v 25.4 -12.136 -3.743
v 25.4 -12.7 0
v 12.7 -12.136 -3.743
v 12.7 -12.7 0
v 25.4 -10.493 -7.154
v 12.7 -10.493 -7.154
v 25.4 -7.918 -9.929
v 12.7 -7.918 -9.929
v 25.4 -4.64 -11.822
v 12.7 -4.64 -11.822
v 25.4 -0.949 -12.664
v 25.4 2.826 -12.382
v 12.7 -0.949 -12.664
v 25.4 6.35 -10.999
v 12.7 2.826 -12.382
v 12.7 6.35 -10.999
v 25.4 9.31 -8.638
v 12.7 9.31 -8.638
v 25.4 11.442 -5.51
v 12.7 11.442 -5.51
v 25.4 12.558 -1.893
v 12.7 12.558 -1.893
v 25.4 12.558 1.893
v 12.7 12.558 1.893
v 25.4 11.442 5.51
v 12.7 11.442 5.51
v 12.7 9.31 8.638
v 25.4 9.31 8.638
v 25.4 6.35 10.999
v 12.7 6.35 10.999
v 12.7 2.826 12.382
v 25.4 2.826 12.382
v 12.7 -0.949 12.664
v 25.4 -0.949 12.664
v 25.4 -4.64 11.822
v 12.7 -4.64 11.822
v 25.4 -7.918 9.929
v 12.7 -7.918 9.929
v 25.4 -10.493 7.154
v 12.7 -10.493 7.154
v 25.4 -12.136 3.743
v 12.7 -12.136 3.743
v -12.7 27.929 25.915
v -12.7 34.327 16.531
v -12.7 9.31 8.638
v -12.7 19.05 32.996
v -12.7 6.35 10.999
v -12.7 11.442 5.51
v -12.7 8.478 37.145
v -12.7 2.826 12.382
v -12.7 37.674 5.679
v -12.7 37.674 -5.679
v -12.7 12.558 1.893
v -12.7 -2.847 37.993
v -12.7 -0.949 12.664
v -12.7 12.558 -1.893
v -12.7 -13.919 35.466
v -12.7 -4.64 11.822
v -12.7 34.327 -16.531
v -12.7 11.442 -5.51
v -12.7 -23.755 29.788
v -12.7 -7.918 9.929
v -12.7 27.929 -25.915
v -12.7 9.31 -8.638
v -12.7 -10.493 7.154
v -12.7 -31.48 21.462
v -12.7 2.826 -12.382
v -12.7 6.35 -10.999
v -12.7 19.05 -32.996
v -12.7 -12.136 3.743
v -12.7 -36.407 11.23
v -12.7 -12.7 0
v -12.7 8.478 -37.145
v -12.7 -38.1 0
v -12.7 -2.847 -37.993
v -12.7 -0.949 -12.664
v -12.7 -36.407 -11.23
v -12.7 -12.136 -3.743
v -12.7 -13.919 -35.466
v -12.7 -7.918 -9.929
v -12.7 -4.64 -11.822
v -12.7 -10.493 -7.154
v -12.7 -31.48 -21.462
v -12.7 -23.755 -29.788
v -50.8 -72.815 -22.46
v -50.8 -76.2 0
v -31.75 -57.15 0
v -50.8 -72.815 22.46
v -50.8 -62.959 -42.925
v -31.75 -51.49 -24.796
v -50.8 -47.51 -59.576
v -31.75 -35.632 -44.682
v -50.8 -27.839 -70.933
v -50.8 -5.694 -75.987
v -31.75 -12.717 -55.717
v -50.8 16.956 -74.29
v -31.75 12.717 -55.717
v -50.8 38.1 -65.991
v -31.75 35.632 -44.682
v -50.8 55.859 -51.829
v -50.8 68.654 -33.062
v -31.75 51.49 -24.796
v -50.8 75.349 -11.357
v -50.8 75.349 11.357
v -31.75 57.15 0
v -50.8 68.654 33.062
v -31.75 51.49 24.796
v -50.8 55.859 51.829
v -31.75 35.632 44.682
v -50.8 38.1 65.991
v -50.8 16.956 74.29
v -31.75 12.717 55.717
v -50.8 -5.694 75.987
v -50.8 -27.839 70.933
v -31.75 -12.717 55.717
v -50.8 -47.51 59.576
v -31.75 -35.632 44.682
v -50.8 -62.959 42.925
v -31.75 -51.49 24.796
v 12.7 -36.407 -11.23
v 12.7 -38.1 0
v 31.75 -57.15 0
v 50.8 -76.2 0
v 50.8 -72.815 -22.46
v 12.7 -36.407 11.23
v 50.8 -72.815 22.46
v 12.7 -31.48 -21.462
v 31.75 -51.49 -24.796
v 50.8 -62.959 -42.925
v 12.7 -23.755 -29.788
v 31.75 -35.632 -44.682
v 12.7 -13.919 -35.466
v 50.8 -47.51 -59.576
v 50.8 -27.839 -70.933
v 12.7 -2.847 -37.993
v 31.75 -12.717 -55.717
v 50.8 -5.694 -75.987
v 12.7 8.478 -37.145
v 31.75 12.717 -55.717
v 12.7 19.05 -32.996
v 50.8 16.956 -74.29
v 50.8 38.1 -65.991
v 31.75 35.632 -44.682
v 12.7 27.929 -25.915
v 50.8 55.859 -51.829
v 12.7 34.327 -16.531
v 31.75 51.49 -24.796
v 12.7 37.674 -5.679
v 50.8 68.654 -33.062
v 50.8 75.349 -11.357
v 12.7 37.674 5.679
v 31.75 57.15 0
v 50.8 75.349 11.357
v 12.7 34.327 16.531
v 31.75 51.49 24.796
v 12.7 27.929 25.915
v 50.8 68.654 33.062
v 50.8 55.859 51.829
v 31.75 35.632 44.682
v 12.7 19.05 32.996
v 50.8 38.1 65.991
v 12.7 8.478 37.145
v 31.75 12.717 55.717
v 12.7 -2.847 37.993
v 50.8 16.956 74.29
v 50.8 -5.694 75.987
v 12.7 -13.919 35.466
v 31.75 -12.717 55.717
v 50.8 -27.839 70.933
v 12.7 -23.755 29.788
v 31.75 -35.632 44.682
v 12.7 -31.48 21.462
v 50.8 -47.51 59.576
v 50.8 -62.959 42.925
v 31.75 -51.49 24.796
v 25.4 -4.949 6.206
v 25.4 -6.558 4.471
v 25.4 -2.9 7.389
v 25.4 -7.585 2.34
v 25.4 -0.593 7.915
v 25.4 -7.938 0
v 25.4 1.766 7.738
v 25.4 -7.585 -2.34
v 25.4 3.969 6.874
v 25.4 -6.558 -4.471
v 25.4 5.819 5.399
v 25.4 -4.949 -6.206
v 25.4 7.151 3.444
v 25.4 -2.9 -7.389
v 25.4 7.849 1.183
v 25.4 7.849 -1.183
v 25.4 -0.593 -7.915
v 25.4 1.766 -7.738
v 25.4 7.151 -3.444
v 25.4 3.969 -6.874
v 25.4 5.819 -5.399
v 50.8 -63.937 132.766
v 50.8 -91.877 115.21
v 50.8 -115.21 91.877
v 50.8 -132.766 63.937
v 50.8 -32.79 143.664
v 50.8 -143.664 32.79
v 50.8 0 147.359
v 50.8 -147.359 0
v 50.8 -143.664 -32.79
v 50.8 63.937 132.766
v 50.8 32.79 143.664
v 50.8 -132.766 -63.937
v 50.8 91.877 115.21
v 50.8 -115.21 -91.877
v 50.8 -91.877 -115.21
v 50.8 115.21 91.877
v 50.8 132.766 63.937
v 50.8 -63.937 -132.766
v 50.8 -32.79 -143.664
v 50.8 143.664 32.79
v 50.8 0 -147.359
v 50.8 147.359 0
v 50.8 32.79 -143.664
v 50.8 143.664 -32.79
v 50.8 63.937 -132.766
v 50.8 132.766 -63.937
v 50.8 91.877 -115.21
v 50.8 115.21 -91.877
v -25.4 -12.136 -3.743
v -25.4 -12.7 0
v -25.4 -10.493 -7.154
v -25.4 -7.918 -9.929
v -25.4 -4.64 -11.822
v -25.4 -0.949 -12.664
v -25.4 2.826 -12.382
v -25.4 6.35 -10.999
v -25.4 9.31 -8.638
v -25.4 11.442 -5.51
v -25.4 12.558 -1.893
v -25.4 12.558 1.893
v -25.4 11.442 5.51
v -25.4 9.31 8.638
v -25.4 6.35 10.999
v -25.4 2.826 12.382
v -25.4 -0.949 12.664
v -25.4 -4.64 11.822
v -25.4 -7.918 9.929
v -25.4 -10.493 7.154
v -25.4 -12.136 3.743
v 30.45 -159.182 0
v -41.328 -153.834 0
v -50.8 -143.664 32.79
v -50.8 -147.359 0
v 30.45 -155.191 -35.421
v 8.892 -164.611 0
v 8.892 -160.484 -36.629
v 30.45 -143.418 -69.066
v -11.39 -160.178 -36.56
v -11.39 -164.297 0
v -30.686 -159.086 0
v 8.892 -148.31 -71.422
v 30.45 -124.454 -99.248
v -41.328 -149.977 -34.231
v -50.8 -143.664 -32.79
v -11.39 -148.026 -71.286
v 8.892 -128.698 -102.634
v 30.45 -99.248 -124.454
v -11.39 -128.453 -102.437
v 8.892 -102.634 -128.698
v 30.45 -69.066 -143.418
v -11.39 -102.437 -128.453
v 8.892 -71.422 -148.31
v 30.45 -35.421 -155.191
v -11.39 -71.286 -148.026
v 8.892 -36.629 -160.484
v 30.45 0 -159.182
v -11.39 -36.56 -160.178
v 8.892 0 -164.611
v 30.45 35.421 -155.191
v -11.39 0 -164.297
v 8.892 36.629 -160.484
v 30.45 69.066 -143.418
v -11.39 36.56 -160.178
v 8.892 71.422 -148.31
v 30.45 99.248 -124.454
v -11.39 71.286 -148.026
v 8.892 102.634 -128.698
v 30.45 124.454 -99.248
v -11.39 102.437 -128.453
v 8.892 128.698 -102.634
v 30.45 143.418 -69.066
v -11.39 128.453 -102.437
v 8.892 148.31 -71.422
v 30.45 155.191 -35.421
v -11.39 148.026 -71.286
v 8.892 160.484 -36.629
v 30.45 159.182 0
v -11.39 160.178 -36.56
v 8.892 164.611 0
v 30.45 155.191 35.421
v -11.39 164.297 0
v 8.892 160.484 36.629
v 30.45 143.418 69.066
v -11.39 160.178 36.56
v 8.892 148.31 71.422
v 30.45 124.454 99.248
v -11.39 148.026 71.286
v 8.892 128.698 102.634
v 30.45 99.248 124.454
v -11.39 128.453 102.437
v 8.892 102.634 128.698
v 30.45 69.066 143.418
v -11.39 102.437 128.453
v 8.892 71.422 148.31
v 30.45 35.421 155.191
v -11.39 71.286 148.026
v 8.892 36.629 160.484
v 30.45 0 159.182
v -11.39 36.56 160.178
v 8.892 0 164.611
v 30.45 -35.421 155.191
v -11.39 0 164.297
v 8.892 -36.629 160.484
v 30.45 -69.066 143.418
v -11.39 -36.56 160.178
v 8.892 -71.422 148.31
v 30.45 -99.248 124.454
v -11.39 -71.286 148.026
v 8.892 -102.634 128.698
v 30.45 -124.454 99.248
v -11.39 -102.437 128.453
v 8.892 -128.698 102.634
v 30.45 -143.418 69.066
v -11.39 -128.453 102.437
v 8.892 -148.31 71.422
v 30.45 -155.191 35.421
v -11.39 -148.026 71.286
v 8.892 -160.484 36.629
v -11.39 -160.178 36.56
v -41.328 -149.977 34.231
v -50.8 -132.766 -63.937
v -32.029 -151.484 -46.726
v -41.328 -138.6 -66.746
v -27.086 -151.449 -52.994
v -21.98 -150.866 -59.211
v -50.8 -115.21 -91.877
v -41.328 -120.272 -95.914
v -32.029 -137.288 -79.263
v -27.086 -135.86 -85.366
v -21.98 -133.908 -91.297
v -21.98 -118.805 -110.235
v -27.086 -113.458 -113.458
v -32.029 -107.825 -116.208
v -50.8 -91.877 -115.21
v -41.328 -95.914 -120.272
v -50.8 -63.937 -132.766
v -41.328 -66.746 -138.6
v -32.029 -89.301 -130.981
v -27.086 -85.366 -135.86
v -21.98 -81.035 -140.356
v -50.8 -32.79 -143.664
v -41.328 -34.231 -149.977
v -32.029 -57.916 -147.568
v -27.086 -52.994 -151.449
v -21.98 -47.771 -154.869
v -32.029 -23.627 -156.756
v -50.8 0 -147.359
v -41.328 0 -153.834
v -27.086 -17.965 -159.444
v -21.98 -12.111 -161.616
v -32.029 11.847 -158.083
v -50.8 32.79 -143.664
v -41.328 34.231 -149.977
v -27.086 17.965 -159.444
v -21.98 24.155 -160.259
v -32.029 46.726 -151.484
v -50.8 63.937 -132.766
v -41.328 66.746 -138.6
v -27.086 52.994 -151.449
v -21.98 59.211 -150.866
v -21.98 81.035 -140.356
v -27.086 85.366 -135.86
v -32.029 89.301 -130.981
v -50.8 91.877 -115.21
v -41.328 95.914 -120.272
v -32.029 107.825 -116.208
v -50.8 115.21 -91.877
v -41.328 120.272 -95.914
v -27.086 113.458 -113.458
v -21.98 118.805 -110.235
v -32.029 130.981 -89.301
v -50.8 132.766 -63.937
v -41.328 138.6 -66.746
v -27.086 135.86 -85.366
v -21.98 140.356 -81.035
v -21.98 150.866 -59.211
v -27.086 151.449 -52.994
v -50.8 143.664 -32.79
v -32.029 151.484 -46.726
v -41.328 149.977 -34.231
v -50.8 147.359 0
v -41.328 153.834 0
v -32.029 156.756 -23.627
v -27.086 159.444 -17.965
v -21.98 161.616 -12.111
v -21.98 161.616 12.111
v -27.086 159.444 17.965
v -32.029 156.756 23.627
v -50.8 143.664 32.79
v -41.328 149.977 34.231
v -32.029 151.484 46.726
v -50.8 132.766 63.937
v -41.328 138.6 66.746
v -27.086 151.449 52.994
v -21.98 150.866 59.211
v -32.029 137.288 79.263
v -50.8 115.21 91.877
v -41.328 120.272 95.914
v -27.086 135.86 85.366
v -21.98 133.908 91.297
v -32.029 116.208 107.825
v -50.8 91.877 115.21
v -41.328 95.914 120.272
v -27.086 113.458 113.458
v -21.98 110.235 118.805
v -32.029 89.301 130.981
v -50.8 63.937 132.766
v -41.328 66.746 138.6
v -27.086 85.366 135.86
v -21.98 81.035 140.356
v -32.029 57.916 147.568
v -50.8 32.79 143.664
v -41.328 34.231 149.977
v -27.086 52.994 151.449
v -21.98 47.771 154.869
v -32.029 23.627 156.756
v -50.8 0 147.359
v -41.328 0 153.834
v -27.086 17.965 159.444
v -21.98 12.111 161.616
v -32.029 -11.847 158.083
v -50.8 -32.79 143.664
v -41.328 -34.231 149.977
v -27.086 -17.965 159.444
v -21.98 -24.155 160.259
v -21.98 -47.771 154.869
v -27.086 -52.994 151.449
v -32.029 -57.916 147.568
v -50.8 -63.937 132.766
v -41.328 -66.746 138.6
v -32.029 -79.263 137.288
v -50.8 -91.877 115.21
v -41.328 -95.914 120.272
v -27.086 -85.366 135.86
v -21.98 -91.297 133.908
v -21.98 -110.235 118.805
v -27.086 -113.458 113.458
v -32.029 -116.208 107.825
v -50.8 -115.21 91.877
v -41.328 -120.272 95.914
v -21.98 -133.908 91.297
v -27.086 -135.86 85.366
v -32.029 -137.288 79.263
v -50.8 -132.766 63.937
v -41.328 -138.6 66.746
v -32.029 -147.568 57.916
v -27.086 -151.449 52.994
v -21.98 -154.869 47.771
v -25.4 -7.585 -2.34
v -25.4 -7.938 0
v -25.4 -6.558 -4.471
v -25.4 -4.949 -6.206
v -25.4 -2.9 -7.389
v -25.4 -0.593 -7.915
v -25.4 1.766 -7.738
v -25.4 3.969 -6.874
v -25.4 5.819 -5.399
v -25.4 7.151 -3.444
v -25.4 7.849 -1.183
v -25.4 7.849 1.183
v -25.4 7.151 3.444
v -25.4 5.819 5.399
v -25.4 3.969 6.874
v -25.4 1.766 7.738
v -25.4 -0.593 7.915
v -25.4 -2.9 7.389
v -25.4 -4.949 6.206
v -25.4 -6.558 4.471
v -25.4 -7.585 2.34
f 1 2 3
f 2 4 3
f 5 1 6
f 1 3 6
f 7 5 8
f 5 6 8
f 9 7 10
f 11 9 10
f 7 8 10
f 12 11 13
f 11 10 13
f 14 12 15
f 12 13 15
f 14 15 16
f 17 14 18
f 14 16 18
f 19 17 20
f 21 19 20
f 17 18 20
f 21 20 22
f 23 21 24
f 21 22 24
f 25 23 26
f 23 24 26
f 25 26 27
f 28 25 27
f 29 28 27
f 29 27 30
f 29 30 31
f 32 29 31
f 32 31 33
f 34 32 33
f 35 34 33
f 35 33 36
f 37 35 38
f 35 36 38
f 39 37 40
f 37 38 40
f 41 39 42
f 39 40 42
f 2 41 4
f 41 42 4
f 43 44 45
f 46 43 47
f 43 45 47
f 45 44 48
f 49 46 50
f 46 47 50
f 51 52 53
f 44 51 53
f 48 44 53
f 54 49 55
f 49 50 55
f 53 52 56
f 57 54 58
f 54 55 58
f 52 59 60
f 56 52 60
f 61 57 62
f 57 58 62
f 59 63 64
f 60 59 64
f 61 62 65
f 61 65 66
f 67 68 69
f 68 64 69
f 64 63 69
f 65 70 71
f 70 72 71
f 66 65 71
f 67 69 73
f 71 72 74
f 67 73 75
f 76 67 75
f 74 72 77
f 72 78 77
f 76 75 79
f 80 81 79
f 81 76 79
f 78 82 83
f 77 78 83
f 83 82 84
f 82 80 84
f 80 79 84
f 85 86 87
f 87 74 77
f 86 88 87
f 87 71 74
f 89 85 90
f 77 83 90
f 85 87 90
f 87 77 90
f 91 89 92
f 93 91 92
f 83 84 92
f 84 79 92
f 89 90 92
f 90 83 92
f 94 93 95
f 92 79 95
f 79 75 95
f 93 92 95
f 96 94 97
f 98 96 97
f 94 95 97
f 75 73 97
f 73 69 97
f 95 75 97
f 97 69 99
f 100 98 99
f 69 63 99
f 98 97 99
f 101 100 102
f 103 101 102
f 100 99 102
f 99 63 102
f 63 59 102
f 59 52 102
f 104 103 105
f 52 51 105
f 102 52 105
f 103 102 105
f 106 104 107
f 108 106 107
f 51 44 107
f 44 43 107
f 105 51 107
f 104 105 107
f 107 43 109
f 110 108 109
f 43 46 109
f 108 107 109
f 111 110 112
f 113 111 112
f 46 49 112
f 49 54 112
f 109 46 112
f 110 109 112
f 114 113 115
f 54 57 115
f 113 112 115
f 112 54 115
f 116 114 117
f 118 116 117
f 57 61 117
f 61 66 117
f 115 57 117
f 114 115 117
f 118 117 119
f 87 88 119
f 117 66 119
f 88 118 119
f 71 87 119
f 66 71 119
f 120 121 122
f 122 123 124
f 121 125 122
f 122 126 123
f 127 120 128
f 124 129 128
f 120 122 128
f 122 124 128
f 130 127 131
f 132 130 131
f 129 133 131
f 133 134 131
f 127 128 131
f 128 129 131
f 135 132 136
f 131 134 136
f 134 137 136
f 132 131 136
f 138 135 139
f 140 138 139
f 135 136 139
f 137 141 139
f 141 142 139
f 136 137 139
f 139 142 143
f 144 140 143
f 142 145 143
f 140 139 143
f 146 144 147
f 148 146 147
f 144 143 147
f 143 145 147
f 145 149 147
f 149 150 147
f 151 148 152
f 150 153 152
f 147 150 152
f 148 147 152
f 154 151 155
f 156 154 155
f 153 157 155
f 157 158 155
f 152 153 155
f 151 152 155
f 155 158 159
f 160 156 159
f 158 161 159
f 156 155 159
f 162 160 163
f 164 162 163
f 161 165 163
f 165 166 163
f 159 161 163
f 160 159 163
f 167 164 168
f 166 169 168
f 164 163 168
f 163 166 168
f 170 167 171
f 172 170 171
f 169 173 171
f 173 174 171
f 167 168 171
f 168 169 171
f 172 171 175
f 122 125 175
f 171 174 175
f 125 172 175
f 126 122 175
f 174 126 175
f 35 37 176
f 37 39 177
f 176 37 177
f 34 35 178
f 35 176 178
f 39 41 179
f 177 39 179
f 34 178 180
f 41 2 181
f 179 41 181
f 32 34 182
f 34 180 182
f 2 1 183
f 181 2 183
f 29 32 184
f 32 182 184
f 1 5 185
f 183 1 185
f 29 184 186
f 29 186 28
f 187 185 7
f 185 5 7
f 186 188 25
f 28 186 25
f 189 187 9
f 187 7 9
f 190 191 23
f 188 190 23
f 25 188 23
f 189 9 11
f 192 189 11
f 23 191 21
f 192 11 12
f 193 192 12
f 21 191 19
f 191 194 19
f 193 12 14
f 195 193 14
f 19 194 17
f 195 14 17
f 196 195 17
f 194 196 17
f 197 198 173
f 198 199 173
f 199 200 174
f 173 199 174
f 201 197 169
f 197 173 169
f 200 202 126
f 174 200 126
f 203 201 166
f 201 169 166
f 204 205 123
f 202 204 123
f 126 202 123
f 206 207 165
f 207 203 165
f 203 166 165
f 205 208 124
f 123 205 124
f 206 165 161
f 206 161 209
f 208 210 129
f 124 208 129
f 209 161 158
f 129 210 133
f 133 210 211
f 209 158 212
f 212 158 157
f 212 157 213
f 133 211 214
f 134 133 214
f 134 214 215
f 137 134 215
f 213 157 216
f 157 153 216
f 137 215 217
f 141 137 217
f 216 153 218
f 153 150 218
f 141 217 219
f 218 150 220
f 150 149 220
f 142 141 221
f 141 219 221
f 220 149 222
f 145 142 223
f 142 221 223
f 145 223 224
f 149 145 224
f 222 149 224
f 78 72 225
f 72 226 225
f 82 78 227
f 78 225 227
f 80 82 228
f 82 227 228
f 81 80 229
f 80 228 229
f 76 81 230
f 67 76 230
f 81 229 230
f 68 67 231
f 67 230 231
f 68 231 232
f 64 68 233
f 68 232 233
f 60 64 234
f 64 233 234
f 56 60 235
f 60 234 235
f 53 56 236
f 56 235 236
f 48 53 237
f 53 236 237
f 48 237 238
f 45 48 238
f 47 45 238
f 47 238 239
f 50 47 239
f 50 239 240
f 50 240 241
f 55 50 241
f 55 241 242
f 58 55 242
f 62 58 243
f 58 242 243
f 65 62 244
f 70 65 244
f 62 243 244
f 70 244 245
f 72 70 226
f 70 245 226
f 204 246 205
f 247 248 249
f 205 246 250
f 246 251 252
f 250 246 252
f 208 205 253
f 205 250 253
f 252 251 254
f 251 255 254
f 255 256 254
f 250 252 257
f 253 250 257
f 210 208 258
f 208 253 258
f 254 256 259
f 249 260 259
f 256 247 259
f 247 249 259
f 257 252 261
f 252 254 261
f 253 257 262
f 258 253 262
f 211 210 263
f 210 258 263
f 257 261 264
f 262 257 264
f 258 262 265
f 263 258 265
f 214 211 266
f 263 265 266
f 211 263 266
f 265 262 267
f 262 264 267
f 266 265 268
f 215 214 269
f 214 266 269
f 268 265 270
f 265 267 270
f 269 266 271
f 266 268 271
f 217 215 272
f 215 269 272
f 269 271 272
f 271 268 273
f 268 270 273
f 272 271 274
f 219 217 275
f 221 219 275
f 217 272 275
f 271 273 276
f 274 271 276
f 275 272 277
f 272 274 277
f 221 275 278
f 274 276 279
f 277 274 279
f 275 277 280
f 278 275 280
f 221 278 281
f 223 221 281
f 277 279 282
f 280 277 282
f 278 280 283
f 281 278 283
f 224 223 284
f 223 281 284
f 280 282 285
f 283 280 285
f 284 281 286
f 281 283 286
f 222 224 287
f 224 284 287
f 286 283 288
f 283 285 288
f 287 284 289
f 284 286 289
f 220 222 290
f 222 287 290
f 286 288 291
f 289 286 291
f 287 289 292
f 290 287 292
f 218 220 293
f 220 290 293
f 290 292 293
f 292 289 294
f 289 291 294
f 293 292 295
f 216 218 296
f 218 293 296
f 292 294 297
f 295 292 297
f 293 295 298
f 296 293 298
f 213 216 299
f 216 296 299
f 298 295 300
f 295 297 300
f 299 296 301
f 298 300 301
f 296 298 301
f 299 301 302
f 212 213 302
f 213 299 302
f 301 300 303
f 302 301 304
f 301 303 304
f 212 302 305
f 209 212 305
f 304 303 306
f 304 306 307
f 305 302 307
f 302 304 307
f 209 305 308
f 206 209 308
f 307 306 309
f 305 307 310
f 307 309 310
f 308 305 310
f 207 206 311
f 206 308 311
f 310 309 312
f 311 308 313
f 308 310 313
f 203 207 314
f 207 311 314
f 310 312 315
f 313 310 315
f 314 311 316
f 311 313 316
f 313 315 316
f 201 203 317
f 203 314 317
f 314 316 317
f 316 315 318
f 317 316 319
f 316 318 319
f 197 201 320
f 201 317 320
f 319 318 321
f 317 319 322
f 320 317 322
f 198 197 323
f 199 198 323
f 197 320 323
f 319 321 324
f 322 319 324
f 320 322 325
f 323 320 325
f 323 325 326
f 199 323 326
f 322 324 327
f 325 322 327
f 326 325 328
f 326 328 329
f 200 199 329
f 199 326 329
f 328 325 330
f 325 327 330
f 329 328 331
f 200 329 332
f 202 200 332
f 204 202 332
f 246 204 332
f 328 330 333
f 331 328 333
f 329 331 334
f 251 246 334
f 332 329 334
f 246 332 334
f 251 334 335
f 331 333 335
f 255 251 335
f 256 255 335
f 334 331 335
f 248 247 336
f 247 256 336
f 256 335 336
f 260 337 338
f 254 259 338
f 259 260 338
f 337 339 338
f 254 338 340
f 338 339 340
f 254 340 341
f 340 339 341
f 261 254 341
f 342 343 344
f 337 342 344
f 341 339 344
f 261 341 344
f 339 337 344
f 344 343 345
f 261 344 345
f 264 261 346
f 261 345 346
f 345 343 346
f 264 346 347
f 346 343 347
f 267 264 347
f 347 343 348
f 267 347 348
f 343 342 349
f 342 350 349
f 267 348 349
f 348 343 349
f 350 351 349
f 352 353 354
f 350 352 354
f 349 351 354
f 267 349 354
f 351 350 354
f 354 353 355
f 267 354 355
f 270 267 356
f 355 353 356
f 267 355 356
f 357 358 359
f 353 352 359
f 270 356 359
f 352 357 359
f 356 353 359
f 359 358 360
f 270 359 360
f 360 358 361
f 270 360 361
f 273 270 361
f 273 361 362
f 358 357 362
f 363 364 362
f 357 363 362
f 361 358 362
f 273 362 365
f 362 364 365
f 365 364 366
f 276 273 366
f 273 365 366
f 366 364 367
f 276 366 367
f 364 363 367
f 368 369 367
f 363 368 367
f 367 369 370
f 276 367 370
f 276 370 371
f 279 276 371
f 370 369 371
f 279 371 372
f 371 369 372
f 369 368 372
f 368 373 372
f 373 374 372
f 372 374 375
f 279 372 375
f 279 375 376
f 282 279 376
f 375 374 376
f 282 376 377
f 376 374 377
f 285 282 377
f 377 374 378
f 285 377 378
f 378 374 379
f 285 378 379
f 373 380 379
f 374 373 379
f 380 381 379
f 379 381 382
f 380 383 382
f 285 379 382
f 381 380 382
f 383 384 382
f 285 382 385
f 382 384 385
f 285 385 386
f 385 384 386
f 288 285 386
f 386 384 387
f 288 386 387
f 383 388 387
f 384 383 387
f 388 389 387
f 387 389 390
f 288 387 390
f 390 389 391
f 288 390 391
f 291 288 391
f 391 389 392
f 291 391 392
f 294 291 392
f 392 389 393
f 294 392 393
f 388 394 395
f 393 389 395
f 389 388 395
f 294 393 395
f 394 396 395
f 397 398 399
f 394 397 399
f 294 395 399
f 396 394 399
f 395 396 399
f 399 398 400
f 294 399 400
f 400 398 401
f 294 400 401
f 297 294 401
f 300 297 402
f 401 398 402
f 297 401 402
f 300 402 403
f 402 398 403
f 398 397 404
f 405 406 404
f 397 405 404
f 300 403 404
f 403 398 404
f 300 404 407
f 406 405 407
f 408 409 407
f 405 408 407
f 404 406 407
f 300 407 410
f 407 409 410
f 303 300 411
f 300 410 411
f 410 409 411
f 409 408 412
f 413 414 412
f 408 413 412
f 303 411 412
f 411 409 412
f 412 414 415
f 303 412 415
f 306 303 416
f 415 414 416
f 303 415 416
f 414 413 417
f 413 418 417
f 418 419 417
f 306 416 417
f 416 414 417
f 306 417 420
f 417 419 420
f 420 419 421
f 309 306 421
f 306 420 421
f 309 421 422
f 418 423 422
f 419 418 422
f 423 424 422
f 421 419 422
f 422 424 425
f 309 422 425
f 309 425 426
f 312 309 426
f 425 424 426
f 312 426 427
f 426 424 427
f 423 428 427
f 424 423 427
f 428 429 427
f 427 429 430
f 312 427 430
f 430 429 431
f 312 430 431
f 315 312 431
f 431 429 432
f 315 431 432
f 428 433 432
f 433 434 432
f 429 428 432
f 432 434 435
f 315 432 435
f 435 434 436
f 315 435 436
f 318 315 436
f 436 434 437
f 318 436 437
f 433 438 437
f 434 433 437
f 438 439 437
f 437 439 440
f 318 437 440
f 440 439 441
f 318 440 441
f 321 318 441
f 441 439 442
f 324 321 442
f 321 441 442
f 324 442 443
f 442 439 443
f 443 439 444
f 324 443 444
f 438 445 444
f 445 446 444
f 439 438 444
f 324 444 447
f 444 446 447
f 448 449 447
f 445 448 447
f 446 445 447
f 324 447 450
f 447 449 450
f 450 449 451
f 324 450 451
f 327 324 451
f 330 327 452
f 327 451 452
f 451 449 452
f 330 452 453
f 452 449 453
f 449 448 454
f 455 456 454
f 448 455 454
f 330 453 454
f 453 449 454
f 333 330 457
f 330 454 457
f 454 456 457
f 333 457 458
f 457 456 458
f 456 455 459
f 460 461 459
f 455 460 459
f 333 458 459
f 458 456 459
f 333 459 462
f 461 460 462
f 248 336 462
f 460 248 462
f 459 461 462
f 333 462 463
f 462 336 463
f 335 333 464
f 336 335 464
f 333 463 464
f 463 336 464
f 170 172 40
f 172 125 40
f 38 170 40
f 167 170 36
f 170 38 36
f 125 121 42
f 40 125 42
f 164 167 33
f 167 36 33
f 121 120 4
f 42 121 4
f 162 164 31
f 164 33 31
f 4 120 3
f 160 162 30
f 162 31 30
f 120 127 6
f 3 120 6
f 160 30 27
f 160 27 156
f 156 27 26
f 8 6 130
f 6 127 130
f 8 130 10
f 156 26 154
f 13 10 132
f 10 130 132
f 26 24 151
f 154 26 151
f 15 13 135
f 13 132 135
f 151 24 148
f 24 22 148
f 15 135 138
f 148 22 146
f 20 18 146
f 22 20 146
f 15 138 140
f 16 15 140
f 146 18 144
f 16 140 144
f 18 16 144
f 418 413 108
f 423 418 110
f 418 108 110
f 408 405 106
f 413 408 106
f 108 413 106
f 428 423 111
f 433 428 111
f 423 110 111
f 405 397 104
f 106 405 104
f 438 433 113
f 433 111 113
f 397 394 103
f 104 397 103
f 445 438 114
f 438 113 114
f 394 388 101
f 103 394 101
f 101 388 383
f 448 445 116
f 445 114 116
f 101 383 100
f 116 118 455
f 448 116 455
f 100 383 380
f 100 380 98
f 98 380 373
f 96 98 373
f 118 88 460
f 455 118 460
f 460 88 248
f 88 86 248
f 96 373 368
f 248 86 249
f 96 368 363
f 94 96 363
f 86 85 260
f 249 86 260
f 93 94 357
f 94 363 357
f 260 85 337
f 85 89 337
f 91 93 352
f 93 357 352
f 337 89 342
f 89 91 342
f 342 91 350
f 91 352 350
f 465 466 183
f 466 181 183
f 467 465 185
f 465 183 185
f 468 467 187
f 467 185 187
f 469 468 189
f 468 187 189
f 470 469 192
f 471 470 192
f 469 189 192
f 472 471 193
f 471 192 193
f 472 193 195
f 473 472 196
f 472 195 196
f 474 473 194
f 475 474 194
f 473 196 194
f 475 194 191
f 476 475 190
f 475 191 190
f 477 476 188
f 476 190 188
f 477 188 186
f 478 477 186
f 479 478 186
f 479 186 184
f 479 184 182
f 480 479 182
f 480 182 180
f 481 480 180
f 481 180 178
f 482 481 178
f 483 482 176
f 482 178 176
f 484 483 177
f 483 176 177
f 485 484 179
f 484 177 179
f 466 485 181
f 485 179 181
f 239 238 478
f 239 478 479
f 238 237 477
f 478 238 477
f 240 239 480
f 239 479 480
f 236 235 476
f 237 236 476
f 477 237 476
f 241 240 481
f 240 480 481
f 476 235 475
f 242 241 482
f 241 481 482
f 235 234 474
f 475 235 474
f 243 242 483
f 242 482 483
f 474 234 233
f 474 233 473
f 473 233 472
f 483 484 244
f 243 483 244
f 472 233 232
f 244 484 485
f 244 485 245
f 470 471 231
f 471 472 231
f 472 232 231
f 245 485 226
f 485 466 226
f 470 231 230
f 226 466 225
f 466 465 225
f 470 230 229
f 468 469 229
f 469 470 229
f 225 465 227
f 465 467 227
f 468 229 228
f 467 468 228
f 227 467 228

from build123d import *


with BuildPart() as part:
    # Sketch7 → Revolve6 (revolve)
    with BuildSketch(Plane.XY, mode=Mode.PRIVATE) as revolve6_sk:
        with BuildLine():
            Line((50.8, 76.2), (50.8, 147.35865108))
            add(Edge.make_bspline(
                [(50.8, 147.35865108), (0, 187.484544424), (-50.8, 147.35865108)],
                knots=[2.485810722, 2.485810722, 2.485810722, 3.797374586, 3.797374586, 3.797374586], degree=2, weights=[1, 0.792571365, 1]))
            Line((-50.8, 147.35865108), (-50.8, 76.2))
            Line((-50.8, 76.2), (-12.7, 38.1))
            Line((-12.7, 38.1), (-12.7, 12.7))
            Line((-12.7, 12.7), (-25.4, 12.7))
            Line((-25.4, 12.7), (-25.4, 7.9375))
            Line((-25.4, 7.9375), (25.4, 7.9375))
            Line((25.4, 7.9375), (25.4, 12.7))
            Line((25.4, 12.7), (12.7, 12.7))
            Line((12.7, 12.7), (12.7, 38.1))
            Line((12.7, 38.1), (50.8, 76.2))
        make_face()
    revolve(revolve6_sk.sketch.rotate(Axis((-25.4, 0, 0), (1, 0, 0)), 180), axis=Axis((-25.4, 0, 0), (1, 0, 0)))


solid = part.part
